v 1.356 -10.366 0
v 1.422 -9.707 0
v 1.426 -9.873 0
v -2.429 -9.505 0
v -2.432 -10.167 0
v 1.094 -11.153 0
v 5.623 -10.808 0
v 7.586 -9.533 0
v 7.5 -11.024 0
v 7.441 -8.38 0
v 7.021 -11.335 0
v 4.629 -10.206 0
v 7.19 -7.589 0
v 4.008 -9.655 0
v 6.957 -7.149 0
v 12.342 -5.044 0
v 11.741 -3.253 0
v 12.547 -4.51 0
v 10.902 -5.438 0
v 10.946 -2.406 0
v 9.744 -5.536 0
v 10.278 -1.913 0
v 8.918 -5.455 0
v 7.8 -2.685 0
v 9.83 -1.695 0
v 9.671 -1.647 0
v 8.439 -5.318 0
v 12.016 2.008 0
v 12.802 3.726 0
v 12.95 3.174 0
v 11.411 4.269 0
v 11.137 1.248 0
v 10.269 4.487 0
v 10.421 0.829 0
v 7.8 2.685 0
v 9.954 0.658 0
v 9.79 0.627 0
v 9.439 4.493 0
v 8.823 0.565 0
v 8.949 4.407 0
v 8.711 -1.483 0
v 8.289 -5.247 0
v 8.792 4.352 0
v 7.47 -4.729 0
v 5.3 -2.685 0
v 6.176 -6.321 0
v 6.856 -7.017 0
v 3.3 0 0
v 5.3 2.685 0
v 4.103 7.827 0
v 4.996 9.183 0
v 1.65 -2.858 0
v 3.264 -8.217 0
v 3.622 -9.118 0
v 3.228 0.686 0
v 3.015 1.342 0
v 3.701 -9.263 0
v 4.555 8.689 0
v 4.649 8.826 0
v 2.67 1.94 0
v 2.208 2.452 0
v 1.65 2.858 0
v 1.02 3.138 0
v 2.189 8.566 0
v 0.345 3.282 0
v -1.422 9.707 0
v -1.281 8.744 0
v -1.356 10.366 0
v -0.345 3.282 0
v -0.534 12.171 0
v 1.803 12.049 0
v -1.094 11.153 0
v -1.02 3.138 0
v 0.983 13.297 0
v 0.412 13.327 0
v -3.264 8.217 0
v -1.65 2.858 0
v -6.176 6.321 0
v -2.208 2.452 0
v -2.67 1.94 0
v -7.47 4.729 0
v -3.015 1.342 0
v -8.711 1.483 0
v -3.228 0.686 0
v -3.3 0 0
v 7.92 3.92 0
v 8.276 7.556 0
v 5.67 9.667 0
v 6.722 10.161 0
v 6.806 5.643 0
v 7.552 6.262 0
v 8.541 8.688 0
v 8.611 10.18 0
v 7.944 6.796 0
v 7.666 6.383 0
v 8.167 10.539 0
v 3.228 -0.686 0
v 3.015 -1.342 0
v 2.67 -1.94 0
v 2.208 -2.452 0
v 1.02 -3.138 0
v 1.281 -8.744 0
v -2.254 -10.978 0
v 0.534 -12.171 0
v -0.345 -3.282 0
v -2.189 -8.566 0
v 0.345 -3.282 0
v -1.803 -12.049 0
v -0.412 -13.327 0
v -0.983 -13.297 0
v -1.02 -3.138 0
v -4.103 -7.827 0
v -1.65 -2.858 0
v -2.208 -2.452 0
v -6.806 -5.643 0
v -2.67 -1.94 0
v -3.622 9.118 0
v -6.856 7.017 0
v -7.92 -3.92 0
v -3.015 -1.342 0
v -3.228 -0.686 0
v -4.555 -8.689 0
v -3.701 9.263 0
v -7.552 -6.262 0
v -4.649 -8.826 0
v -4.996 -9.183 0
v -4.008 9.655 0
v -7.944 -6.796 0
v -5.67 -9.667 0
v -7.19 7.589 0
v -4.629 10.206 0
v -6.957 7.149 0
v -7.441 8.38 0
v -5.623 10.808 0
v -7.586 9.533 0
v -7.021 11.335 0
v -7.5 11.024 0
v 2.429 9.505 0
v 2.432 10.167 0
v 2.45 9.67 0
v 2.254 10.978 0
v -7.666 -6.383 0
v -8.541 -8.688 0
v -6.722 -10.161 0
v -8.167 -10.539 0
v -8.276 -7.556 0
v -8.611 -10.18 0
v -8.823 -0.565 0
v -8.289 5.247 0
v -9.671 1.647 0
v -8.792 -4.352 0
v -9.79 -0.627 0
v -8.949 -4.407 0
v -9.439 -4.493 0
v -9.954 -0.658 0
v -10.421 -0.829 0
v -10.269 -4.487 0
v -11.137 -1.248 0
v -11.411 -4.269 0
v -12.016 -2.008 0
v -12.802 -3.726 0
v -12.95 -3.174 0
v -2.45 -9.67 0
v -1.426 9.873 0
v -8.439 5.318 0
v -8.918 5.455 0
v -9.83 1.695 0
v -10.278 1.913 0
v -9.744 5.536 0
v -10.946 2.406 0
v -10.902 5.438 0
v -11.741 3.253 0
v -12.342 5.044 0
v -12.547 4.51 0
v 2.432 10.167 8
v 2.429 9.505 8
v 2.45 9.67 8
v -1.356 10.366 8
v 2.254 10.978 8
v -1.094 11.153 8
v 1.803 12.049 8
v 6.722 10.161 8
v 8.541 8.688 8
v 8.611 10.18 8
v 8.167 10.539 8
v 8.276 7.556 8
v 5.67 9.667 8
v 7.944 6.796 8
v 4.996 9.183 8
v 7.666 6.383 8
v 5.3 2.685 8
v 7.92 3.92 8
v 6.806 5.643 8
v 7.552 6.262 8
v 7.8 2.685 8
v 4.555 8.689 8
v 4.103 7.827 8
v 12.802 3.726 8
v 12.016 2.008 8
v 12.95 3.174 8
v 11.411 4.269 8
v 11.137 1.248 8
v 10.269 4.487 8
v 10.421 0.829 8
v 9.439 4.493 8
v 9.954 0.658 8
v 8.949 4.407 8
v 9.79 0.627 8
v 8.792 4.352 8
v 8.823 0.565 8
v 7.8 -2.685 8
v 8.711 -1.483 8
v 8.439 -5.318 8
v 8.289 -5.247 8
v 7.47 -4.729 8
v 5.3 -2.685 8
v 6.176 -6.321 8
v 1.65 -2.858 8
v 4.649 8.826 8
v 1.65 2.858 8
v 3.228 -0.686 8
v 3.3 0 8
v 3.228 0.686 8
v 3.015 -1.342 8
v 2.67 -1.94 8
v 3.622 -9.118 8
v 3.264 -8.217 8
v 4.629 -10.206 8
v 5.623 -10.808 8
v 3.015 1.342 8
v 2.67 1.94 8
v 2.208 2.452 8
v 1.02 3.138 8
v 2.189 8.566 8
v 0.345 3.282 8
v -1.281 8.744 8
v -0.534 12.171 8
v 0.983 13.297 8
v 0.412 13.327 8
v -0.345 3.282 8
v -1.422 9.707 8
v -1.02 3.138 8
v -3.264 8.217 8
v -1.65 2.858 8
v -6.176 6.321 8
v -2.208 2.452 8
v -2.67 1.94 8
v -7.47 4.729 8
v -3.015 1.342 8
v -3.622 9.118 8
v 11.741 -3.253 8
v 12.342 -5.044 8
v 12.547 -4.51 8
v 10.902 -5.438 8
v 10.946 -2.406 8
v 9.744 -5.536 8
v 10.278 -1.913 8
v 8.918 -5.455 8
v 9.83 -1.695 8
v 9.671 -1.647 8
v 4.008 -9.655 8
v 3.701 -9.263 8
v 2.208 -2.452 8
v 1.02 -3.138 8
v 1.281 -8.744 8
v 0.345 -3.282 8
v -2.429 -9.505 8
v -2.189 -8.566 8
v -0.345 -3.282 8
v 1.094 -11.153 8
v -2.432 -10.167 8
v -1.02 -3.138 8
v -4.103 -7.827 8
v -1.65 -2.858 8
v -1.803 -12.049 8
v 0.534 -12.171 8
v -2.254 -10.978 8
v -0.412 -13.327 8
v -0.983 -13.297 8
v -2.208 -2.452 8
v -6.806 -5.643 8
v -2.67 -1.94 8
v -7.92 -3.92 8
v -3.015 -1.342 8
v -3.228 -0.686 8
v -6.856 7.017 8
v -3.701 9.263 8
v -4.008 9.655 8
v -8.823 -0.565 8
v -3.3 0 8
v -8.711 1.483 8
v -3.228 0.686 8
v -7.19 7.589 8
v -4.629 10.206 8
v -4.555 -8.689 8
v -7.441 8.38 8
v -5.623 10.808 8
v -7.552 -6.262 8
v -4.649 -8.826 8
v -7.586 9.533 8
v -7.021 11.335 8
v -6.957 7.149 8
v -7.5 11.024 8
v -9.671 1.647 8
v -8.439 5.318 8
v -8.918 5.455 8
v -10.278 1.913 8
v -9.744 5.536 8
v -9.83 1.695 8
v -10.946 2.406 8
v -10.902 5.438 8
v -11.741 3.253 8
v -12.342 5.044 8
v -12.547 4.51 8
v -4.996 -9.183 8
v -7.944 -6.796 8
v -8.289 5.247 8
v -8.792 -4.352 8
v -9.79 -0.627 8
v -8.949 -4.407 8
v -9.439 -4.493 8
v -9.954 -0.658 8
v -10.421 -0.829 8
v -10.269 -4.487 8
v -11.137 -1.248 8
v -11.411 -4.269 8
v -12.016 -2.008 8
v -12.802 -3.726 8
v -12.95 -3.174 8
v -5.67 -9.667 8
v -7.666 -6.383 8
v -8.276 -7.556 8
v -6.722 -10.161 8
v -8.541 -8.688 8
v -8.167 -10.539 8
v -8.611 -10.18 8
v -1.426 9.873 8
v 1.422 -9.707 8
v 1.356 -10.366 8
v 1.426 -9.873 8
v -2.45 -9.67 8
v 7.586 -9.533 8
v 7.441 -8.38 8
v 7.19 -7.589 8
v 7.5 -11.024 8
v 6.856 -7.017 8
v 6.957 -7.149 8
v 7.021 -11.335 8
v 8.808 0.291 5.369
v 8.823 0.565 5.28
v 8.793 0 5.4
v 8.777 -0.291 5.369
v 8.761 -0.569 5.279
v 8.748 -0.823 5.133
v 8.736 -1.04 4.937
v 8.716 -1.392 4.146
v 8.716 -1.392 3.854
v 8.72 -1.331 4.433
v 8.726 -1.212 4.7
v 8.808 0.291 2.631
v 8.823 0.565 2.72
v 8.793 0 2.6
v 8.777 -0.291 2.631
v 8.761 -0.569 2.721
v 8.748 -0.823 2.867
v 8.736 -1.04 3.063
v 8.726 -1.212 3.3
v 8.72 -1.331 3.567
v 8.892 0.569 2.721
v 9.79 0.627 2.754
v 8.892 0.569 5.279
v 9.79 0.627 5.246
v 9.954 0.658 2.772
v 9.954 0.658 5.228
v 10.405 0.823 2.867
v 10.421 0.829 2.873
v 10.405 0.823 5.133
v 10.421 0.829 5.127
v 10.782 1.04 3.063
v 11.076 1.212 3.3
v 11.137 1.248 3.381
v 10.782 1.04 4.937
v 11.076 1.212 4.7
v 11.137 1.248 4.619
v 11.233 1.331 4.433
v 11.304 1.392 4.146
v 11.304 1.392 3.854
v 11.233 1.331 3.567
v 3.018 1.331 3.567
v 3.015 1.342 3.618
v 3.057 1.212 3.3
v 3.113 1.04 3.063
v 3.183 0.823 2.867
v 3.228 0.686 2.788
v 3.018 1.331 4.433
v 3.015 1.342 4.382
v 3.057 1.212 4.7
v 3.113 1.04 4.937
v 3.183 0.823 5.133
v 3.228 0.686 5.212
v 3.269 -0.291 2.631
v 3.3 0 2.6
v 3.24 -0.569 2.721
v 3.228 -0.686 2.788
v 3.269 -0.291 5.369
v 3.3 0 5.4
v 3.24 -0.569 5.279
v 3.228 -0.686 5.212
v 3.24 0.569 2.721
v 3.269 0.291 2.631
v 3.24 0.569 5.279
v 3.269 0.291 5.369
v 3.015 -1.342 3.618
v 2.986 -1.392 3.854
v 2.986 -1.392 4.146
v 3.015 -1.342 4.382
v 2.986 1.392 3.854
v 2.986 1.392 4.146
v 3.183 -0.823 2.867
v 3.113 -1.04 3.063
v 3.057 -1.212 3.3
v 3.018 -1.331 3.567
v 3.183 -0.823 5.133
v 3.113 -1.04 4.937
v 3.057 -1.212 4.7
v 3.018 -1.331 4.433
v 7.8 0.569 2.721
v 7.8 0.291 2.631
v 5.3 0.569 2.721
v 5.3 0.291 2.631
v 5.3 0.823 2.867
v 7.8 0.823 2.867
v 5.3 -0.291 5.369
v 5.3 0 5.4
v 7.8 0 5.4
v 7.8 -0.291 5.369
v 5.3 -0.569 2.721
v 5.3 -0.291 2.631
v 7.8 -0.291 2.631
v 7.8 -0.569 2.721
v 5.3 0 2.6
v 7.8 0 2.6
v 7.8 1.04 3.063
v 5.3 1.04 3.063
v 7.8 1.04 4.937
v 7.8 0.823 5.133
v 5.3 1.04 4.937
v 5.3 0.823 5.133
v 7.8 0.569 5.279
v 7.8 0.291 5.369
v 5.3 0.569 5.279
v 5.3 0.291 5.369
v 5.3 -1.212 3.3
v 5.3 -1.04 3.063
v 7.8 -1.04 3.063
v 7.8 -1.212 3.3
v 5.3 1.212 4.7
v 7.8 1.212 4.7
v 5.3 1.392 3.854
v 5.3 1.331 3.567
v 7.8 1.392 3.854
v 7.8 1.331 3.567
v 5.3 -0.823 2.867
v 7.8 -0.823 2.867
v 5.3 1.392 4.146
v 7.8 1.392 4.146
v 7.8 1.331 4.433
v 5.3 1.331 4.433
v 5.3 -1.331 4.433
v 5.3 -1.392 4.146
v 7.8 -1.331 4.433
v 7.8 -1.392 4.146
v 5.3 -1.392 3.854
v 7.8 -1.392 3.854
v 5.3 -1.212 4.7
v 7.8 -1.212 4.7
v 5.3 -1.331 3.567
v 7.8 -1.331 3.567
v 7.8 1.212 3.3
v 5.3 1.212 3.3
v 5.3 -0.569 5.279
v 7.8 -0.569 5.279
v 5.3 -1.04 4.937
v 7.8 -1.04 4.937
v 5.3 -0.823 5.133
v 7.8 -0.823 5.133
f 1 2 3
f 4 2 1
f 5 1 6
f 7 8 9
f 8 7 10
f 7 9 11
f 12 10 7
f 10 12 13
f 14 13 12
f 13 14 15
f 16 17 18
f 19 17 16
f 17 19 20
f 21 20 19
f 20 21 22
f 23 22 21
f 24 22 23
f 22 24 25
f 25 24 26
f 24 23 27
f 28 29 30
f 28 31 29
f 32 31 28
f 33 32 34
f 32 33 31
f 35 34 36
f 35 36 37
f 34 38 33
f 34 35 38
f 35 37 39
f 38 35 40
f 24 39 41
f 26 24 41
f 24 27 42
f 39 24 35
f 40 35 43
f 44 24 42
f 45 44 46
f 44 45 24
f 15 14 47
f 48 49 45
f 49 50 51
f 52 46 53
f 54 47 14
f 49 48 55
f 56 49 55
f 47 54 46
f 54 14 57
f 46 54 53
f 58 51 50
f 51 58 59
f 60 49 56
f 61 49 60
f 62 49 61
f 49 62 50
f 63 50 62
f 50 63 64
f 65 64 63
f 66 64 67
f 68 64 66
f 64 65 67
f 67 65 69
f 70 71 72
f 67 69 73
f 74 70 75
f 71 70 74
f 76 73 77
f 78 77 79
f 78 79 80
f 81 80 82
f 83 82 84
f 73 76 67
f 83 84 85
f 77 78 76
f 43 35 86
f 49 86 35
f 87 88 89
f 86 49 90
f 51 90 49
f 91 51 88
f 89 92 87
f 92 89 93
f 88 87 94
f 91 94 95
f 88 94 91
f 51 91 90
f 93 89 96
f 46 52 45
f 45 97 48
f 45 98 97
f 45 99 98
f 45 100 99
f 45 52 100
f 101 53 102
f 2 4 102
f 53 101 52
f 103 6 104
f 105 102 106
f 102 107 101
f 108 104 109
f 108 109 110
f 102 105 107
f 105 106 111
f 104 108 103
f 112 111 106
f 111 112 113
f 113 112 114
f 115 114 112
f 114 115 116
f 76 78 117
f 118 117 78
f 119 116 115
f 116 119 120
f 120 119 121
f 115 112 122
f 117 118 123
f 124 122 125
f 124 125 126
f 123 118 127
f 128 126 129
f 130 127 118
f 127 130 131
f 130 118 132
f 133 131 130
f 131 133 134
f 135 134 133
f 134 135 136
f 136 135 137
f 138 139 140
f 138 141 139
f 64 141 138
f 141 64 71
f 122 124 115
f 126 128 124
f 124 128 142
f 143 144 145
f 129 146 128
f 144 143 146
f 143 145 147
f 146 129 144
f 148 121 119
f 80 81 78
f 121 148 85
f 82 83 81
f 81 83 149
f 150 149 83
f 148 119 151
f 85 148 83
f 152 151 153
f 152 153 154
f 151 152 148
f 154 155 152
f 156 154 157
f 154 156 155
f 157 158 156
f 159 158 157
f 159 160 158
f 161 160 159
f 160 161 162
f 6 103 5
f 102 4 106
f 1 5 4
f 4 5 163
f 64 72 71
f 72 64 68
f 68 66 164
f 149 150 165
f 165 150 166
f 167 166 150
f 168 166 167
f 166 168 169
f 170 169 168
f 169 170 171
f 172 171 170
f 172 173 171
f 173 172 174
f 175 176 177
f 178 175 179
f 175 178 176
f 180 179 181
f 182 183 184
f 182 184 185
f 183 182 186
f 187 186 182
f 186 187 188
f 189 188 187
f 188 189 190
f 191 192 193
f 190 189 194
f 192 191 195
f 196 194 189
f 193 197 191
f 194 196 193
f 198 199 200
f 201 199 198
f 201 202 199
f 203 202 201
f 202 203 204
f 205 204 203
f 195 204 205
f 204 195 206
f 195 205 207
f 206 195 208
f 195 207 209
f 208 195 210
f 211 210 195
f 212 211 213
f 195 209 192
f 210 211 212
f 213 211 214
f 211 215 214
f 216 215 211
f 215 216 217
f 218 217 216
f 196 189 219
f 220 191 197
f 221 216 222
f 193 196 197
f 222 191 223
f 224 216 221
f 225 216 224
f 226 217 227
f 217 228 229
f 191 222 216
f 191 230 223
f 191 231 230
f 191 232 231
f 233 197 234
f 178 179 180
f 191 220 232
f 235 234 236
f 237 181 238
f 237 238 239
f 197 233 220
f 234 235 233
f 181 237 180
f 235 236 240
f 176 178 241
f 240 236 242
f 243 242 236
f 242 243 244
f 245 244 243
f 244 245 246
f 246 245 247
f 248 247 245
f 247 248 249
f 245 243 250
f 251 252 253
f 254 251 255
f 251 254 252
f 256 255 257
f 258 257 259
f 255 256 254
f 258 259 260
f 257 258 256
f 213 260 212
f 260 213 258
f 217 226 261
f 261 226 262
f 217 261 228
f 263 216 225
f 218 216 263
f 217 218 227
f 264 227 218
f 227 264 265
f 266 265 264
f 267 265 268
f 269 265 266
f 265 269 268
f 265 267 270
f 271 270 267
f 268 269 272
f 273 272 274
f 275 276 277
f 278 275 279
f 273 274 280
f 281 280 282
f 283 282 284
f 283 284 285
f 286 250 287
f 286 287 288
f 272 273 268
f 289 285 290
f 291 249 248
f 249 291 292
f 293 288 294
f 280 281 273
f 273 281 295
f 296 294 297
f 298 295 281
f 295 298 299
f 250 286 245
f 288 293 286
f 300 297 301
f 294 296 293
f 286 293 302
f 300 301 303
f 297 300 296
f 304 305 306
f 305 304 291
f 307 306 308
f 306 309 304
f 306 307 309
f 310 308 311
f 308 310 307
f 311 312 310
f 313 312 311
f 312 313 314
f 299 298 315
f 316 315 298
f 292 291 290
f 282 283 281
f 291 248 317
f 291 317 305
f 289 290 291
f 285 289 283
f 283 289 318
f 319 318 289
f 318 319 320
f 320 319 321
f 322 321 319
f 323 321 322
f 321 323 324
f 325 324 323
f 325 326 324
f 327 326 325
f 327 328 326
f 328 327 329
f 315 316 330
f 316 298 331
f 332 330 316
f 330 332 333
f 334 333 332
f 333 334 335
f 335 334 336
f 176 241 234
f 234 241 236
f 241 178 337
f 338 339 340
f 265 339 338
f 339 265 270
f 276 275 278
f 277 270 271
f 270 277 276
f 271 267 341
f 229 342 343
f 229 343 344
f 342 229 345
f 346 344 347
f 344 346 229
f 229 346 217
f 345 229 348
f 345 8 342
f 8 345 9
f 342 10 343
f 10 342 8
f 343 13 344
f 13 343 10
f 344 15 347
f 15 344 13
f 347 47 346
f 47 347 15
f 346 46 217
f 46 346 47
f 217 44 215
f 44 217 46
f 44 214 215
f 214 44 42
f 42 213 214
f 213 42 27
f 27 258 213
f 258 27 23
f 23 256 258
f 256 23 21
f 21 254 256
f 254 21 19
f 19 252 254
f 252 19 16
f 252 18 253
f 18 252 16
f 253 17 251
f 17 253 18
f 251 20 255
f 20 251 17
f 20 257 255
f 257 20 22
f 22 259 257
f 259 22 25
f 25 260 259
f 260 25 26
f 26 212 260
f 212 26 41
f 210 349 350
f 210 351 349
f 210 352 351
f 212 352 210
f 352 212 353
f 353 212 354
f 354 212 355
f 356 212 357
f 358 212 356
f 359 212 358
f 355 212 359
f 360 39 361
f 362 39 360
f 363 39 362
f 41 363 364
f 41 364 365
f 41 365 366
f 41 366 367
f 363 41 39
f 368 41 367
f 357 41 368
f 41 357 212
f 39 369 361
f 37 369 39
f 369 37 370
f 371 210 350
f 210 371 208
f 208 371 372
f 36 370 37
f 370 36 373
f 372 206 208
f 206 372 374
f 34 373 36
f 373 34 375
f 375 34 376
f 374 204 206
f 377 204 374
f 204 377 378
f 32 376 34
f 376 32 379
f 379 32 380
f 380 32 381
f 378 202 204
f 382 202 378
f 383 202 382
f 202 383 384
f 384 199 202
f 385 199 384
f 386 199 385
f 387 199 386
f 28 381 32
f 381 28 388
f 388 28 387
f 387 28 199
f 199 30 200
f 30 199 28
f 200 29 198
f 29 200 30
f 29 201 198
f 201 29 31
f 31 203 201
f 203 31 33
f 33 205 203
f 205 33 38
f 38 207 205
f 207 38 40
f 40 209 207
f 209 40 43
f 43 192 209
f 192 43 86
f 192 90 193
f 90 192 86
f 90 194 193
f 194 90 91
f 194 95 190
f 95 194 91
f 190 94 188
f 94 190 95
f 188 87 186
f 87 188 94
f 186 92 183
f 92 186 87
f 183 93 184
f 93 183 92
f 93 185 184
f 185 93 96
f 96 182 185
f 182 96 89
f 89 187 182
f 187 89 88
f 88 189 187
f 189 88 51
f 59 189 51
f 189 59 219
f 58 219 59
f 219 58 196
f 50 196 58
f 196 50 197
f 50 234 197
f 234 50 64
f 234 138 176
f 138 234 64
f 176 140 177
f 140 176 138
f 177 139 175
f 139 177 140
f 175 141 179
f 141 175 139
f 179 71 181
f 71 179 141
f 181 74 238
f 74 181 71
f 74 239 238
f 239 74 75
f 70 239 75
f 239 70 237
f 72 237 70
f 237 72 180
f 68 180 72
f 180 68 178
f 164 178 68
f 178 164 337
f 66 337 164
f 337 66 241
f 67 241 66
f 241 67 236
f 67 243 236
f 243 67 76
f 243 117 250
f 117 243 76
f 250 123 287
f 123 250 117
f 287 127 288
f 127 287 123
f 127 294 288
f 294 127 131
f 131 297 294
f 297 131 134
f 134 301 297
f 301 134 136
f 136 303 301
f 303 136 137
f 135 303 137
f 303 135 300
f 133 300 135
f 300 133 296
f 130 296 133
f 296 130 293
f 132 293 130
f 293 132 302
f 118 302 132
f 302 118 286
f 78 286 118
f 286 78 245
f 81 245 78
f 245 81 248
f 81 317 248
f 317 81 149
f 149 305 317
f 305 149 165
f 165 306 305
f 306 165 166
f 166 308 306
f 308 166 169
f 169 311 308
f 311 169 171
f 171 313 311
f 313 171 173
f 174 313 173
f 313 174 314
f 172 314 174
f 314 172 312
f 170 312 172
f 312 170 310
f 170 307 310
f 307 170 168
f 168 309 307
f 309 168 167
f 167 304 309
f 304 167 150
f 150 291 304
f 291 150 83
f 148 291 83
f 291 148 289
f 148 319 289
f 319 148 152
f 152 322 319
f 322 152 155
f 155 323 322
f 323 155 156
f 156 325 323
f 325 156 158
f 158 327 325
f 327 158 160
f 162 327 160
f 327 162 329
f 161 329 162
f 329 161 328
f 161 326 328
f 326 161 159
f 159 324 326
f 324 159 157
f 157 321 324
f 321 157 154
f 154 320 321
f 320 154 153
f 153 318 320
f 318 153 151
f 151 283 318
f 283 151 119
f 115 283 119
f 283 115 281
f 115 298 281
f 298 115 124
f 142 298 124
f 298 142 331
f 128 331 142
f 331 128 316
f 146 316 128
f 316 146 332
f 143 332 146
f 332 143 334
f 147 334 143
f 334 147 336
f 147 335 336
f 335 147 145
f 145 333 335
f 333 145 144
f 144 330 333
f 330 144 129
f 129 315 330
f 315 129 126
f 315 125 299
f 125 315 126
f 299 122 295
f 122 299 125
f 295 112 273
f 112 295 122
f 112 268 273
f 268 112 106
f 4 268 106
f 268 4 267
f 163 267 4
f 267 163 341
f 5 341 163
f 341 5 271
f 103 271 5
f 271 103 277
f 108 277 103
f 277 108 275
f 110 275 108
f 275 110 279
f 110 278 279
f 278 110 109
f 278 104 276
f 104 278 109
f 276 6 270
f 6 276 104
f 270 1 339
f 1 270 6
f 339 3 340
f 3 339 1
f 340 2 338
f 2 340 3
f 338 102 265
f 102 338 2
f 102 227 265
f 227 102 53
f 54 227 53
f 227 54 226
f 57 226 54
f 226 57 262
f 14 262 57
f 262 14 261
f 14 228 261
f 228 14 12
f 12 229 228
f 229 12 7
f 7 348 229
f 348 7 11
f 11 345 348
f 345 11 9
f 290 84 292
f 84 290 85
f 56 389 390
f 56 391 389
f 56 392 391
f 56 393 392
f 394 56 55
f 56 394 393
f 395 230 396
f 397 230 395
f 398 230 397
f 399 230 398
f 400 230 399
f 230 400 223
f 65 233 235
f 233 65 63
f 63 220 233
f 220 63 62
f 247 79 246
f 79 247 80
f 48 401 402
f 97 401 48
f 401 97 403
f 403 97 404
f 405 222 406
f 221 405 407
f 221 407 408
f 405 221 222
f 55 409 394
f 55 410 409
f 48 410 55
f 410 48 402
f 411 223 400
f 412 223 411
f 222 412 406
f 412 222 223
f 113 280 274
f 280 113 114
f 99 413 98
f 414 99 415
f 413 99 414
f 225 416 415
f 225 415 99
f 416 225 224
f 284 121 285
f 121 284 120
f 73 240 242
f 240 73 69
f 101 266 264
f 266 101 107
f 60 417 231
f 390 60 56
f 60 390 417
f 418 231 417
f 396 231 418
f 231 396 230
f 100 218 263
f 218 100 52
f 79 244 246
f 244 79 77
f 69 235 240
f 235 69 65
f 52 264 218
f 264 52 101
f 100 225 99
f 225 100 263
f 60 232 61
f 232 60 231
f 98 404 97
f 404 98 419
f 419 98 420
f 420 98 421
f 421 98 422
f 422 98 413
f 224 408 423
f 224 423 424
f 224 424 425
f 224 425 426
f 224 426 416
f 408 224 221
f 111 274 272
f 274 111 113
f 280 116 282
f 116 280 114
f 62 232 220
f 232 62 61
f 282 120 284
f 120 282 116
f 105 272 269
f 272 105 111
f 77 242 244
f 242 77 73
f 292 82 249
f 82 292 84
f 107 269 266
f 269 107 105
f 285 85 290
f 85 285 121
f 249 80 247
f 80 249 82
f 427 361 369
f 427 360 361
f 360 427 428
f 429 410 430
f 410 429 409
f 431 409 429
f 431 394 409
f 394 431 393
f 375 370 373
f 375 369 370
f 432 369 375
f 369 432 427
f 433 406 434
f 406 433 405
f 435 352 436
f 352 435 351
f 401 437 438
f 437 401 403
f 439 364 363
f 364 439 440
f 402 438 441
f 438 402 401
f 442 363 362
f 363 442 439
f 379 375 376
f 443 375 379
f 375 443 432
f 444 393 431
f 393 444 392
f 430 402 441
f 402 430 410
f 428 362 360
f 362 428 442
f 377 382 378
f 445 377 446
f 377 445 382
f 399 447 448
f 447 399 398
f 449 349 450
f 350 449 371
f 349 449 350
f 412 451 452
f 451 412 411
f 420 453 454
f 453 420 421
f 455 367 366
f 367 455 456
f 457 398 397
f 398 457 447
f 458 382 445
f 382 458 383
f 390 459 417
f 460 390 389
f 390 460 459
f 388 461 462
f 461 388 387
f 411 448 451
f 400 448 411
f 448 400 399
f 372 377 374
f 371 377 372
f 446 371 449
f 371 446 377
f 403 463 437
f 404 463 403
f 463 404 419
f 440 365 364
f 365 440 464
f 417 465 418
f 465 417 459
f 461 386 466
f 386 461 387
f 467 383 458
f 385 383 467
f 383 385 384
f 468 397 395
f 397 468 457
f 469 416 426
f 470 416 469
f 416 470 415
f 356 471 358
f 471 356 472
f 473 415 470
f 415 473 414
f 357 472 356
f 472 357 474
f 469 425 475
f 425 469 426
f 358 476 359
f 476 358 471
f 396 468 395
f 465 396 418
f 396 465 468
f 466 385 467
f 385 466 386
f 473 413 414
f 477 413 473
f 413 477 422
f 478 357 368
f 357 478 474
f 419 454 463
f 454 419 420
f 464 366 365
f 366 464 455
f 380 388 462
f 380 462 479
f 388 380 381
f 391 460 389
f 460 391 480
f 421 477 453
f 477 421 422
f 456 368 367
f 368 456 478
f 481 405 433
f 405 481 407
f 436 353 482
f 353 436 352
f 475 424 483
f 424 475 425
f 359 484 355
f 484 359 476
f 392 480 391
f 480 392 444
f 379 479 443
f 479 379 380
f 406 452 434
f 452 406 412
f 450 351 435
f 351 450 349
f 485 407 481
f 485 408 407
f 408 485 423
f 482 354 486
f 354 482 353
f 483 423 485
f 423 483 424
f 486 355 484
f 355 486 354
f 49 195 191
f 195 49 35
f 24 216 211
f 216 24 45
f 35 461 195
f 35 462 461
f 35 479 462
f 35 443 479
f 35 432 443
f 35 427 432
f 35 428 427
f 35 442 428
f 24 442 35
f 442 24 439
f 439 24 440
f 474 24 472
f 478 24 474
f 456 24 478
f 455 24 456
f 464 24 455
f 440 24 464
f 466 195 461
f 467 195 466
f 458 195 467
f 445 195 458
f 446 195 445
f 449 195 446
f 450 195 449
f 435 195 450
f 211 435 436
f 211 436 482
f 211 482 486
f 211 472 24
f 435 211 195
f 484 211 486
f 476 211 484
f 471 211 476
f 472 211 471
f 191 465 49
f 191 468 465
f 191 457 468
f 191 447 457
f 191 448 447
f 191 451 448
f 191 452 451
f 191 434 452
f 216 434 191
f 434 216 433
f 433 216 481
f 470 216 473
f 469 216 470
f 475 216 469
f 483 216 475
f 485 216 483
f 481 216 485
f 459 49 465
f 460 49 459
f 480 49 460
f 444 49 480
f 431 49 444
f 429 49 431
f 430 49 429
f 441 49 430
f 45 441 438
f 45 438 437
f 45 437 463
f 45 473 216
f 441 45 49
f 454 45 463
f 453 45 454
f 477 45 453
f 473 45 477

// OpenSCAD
// file: ../basic_scad/config.scad
// Author: Mihai Oltean, www.tcreate.org, mihai.oltean@gmail.com
// More details: jenny5.org
// Source: github.com/jenny5-robot
// MIT License
//--------------------------------------------------------------

aluminium_color = "Silver";
screw_color = "LightSlateGray";
frame_color = aluminium_color;
shaft_color = "Silver";
plastic_color = "LimeGreen";
pulley_color = "DarkSlateGray";
steel_color = "LightSlateGray";
// file: ../basic_scad/params_basic_components.scad
// Author: Mihai Oltean, www.tcreate.org, mihai.oltean@gmail.com
// More details: jenny5.org
// Source: github.com/jenny5-robot
// MIT License
//--------------------------------------------------------------

spring_length = 20;

smooth_rod_8_radius = 4;
smooth_rod_10_radius = 5;
smooth_rod_12_radius = 6;

tolerance = 0.1;
display_tolerance = 1;

overlap_tolerance = 0.01;

wall_thick_1 = 1;
wall_thick_2 = 2;
wall_thick_3 = 3;
wall_thick_4 = 4;
wall_thick_5 = 5;
wall_thick_5_5 = 5.5;
wall_thick_6 = 6;
wall_thick_7 = 7;
wall_thick_8 = 8;
wall_thick_9 = 9;
wall_thick_10 = 10;
wall_thick_12 = 10;

tolerance_z = [0, 0, tolerance];
tolerance_x = [tolerance, 0, 0];
tolerance_y = [0, tolerance, 0];

display_tolerance_z = [0, 0, display_tolerance];
display_tolerance_x = [display_tolerance, 0, 0];
display_tolerance_y = [0, display_tolerance, 0];

display_tolerance_xz = [display_tolerance, 0, display_tolerance];
display_tolerance_xy = [display_tolerance, display_tolerance, 0];
display_tolerance_yz = [0, display_tolerance, display_tolerance];

display_tolerance_xyz = [display_tolerance, display_tolerance, display_tolerance];
// file: ../basic_scad/params_screws_nuts_washers.scad
// Author: Mihai Oltean, www.tcreate.org, mihai.oltean@gmail.com
// More details: jenny5.org
// Source: github.com/jenny5-robot
// MIT License
//--------------------------------------------------------------


m2_screw_radius = 1;
m2_nut_radius = 2.2;
m2_nut_height = 1.6;
m2_nut_thick = m2_nut_height;

m3_screw_radius = 1.5;
m3_nut_radius = 3.1;
m3_nut_height = 2.3;
m3_nut_thick = m3_nut_height;
m3_autolock_nut_thick = 4.2;

m4_screw_radius = 2;
m4_nut_radius = 4;
m4_auto_lock_nut_height = 5;
m4_nut_height = 3.25;
m4_nut_thick = 3.25;

m5_screw_radius = 2.5;
m5_nut_radius = 4.6;
m5_nut_height = 4;

m6_screw_radius = 3;
m6_nut_radius = 5.65;
m6_nut_thick = 5;
m6_nut_slim_thick = 3;
m6_autolock_nut_thick = 6;
m6_long_nut_thick = 9;

m8_screw_head_height = 5.7;
m8_screw_radius = 3.9;
m8_nut_small_width = 12.8;
m8_nut_radius = 7.3;
m8_slim_nut_small_width = 12.4;
m8_nut_thick = 6.5;
m8_nut_height = m8_nut_thick;
m8_slim_nut_height = 5.5;
m8_screw_head_radius = 6.5;
m8_autolock_nut_thick = 8;

m10_screw_radius = 5;
m10_nut_thick = 8;
m10_nut_radius = 9.8;

M12_screw_radius = 6;
M12_nut_thick = 10;
M12_nut_radius = 11;
M12_long_long_nut_thick = 36;
M12_long_nut_thick = 36;
M12_autolock_nut_thick = 14;

m10_long_nut_radius = 9.71;
m10_long_nut_height = 29.8;

m10_long_thick_nut_radius = 7.41;
m10_long_thick_nut_height = 30.4;

m12_plastic_nut_radius = 10.45;
m12_plastic_nut_height = 23.3;

tr12_3_nut_radius = 11;
tr12_3_nut_height = 18.1;

washer_5 = 0.97;

washer_4_12_radius = 6;
washer_4_12_external_radius = 6;
washer_4_12_thick = 1;
washer_4_thick = 1;
washer_4_12_internal_radius = 2.15;

washer_4_9_external_radius = 4.5;
washer_4_9_internal_radius = 2.15;
washer_4_9_thick = 1;

washer_6_thick = 1.7;
washer_8_thick = 1.5;
washer_5_thick = 1;

washer_10_height = 2;
washer_10_thick = 2;

washer_12_thick = 2;

washer_5_15_external_radius = 7.5;
washer_5_15_thick = 1;
washer_5_thick = 1;
washer_5_15_internal_radius = 2.65;
// main file
// Author: Mihai Oltean, www.tcreate.org, mihai.oltean@gmail.com
// More details: jenny5.org
// Source: github.com/jenny5-robot
// MIT License
//--------------------------------------------------------------

use <../basic_scad/parametric_involute_gear_v5.0.scad>
include <../basic_scad/params_screws_nuts_washers.scad>
include <../basic_scad/params_basic_components.scad>

include <../basic_scad/config.scad>
//--------------------------------------------------------------------
module bone_gear(num_teeth = 14, screw_rotation_angle = 13, internal_radius = 12.5, height = 10)
{    
    difference(){
        rotate ([0, 0, screw_rotation_angle])
		gear ( 
			number_of_teeth=num_teeth,
			circular_pitch=400,
			//pressure_angle=20,
			clearance = 0,
			gear_thickness=10,
			rim_thickness=10,
			rim_width=5,
			hub_thickness=0,
			hub_diameter=0,
			bore_diameter=0,
			//circles=6,
			backlash=0.1,
			//twist=--2,
			involute_facets=0,
			flat=false
        );
        translate (-display_tolerance_z) cylinder( h = height + 2 * display_tolerance, r = internal_radius, $fn = 50);
        
          // m3 screw hole
    translate ([0, 0, height / 2]) rotate([0, 90, 0]) cylinder (h = 20, r = 1.4, $fn = 30);  
    // m3 nut hole
    translate ([internal_radius - 1, 0, height / 2]) rotate([0, 90, 0]) cylinder (h = 3, r = m3_nut_radius + 0.1, $fn = 6);  

    }
}
//--------------------------------------------------------------------
module pot_gear(num_teeth = 10, internal_radius = 3.3, height = 8, screw_rotation_angle = 15)
{
    
    difference(){
		color (plastic_color)
        rotate ([0, 0, screw_rotation_angle])
        gear ( 
			number_of_teeth=num_teeth,
			circular_pitch=400,
			//pressure_angle=20,
			clearance = 0,
			gear_thickness=height,
			rim_thickness=height,
			rim_width=5,
			hub_thickness=0,
			hub_diameter=0,
			bore_diameter=0,
			//circles=6,
			backlash=0.1,
			//twist=--2,
			involute_facets=0,
			flat=false
        );
        translate (-display_tolerance_z) cylinder (h = height + 2 * display_tolerance, r = internal_radius, $fn = 30);
        
          // m3 screw hole
        translate ([0, 0, height / 2]) rotate([0, 90, 0]) cylinder (h = 22, r = 1.4, $fn = 30);  
        // m3 nut hole
        hull(){
            translate ([internal_radius + 2, 0, 0]) rotate([0, 90, 0]) cylinder (h = 2.5, r = m3_nut_radius, $fn = 6);  
            translate ([internal_radius + 2, 0, height]) rotate([0, 90, 0]) cylinder (h = 2.5, r = m3_nut_radius, $fn = 6);  
        }
    }
}
//--------------------------------------------------------------------

//pot_gear(num_teeth = 12, internal_radius = 4, height = 8);// 2x 

//pot_gear(num_teeth = 11, screw_angle = 13, internal_radius = 6.6, height = 10); 

//pot_gear(num_teeth = 15, internal_radius = 3.3, height = 8); 

//pot_gear(13, 13);

//pot_gear(18, 10);

//pot_gear(19, 10);

pot_gear(num_teeth = 10, internal_radius = 3.3, height = 8, screw_rotation_angle = 15);

//bone_gear(num_teeth = 17, screw_rotation_angle = 11, internal_radius = 12.5, height = 10);
